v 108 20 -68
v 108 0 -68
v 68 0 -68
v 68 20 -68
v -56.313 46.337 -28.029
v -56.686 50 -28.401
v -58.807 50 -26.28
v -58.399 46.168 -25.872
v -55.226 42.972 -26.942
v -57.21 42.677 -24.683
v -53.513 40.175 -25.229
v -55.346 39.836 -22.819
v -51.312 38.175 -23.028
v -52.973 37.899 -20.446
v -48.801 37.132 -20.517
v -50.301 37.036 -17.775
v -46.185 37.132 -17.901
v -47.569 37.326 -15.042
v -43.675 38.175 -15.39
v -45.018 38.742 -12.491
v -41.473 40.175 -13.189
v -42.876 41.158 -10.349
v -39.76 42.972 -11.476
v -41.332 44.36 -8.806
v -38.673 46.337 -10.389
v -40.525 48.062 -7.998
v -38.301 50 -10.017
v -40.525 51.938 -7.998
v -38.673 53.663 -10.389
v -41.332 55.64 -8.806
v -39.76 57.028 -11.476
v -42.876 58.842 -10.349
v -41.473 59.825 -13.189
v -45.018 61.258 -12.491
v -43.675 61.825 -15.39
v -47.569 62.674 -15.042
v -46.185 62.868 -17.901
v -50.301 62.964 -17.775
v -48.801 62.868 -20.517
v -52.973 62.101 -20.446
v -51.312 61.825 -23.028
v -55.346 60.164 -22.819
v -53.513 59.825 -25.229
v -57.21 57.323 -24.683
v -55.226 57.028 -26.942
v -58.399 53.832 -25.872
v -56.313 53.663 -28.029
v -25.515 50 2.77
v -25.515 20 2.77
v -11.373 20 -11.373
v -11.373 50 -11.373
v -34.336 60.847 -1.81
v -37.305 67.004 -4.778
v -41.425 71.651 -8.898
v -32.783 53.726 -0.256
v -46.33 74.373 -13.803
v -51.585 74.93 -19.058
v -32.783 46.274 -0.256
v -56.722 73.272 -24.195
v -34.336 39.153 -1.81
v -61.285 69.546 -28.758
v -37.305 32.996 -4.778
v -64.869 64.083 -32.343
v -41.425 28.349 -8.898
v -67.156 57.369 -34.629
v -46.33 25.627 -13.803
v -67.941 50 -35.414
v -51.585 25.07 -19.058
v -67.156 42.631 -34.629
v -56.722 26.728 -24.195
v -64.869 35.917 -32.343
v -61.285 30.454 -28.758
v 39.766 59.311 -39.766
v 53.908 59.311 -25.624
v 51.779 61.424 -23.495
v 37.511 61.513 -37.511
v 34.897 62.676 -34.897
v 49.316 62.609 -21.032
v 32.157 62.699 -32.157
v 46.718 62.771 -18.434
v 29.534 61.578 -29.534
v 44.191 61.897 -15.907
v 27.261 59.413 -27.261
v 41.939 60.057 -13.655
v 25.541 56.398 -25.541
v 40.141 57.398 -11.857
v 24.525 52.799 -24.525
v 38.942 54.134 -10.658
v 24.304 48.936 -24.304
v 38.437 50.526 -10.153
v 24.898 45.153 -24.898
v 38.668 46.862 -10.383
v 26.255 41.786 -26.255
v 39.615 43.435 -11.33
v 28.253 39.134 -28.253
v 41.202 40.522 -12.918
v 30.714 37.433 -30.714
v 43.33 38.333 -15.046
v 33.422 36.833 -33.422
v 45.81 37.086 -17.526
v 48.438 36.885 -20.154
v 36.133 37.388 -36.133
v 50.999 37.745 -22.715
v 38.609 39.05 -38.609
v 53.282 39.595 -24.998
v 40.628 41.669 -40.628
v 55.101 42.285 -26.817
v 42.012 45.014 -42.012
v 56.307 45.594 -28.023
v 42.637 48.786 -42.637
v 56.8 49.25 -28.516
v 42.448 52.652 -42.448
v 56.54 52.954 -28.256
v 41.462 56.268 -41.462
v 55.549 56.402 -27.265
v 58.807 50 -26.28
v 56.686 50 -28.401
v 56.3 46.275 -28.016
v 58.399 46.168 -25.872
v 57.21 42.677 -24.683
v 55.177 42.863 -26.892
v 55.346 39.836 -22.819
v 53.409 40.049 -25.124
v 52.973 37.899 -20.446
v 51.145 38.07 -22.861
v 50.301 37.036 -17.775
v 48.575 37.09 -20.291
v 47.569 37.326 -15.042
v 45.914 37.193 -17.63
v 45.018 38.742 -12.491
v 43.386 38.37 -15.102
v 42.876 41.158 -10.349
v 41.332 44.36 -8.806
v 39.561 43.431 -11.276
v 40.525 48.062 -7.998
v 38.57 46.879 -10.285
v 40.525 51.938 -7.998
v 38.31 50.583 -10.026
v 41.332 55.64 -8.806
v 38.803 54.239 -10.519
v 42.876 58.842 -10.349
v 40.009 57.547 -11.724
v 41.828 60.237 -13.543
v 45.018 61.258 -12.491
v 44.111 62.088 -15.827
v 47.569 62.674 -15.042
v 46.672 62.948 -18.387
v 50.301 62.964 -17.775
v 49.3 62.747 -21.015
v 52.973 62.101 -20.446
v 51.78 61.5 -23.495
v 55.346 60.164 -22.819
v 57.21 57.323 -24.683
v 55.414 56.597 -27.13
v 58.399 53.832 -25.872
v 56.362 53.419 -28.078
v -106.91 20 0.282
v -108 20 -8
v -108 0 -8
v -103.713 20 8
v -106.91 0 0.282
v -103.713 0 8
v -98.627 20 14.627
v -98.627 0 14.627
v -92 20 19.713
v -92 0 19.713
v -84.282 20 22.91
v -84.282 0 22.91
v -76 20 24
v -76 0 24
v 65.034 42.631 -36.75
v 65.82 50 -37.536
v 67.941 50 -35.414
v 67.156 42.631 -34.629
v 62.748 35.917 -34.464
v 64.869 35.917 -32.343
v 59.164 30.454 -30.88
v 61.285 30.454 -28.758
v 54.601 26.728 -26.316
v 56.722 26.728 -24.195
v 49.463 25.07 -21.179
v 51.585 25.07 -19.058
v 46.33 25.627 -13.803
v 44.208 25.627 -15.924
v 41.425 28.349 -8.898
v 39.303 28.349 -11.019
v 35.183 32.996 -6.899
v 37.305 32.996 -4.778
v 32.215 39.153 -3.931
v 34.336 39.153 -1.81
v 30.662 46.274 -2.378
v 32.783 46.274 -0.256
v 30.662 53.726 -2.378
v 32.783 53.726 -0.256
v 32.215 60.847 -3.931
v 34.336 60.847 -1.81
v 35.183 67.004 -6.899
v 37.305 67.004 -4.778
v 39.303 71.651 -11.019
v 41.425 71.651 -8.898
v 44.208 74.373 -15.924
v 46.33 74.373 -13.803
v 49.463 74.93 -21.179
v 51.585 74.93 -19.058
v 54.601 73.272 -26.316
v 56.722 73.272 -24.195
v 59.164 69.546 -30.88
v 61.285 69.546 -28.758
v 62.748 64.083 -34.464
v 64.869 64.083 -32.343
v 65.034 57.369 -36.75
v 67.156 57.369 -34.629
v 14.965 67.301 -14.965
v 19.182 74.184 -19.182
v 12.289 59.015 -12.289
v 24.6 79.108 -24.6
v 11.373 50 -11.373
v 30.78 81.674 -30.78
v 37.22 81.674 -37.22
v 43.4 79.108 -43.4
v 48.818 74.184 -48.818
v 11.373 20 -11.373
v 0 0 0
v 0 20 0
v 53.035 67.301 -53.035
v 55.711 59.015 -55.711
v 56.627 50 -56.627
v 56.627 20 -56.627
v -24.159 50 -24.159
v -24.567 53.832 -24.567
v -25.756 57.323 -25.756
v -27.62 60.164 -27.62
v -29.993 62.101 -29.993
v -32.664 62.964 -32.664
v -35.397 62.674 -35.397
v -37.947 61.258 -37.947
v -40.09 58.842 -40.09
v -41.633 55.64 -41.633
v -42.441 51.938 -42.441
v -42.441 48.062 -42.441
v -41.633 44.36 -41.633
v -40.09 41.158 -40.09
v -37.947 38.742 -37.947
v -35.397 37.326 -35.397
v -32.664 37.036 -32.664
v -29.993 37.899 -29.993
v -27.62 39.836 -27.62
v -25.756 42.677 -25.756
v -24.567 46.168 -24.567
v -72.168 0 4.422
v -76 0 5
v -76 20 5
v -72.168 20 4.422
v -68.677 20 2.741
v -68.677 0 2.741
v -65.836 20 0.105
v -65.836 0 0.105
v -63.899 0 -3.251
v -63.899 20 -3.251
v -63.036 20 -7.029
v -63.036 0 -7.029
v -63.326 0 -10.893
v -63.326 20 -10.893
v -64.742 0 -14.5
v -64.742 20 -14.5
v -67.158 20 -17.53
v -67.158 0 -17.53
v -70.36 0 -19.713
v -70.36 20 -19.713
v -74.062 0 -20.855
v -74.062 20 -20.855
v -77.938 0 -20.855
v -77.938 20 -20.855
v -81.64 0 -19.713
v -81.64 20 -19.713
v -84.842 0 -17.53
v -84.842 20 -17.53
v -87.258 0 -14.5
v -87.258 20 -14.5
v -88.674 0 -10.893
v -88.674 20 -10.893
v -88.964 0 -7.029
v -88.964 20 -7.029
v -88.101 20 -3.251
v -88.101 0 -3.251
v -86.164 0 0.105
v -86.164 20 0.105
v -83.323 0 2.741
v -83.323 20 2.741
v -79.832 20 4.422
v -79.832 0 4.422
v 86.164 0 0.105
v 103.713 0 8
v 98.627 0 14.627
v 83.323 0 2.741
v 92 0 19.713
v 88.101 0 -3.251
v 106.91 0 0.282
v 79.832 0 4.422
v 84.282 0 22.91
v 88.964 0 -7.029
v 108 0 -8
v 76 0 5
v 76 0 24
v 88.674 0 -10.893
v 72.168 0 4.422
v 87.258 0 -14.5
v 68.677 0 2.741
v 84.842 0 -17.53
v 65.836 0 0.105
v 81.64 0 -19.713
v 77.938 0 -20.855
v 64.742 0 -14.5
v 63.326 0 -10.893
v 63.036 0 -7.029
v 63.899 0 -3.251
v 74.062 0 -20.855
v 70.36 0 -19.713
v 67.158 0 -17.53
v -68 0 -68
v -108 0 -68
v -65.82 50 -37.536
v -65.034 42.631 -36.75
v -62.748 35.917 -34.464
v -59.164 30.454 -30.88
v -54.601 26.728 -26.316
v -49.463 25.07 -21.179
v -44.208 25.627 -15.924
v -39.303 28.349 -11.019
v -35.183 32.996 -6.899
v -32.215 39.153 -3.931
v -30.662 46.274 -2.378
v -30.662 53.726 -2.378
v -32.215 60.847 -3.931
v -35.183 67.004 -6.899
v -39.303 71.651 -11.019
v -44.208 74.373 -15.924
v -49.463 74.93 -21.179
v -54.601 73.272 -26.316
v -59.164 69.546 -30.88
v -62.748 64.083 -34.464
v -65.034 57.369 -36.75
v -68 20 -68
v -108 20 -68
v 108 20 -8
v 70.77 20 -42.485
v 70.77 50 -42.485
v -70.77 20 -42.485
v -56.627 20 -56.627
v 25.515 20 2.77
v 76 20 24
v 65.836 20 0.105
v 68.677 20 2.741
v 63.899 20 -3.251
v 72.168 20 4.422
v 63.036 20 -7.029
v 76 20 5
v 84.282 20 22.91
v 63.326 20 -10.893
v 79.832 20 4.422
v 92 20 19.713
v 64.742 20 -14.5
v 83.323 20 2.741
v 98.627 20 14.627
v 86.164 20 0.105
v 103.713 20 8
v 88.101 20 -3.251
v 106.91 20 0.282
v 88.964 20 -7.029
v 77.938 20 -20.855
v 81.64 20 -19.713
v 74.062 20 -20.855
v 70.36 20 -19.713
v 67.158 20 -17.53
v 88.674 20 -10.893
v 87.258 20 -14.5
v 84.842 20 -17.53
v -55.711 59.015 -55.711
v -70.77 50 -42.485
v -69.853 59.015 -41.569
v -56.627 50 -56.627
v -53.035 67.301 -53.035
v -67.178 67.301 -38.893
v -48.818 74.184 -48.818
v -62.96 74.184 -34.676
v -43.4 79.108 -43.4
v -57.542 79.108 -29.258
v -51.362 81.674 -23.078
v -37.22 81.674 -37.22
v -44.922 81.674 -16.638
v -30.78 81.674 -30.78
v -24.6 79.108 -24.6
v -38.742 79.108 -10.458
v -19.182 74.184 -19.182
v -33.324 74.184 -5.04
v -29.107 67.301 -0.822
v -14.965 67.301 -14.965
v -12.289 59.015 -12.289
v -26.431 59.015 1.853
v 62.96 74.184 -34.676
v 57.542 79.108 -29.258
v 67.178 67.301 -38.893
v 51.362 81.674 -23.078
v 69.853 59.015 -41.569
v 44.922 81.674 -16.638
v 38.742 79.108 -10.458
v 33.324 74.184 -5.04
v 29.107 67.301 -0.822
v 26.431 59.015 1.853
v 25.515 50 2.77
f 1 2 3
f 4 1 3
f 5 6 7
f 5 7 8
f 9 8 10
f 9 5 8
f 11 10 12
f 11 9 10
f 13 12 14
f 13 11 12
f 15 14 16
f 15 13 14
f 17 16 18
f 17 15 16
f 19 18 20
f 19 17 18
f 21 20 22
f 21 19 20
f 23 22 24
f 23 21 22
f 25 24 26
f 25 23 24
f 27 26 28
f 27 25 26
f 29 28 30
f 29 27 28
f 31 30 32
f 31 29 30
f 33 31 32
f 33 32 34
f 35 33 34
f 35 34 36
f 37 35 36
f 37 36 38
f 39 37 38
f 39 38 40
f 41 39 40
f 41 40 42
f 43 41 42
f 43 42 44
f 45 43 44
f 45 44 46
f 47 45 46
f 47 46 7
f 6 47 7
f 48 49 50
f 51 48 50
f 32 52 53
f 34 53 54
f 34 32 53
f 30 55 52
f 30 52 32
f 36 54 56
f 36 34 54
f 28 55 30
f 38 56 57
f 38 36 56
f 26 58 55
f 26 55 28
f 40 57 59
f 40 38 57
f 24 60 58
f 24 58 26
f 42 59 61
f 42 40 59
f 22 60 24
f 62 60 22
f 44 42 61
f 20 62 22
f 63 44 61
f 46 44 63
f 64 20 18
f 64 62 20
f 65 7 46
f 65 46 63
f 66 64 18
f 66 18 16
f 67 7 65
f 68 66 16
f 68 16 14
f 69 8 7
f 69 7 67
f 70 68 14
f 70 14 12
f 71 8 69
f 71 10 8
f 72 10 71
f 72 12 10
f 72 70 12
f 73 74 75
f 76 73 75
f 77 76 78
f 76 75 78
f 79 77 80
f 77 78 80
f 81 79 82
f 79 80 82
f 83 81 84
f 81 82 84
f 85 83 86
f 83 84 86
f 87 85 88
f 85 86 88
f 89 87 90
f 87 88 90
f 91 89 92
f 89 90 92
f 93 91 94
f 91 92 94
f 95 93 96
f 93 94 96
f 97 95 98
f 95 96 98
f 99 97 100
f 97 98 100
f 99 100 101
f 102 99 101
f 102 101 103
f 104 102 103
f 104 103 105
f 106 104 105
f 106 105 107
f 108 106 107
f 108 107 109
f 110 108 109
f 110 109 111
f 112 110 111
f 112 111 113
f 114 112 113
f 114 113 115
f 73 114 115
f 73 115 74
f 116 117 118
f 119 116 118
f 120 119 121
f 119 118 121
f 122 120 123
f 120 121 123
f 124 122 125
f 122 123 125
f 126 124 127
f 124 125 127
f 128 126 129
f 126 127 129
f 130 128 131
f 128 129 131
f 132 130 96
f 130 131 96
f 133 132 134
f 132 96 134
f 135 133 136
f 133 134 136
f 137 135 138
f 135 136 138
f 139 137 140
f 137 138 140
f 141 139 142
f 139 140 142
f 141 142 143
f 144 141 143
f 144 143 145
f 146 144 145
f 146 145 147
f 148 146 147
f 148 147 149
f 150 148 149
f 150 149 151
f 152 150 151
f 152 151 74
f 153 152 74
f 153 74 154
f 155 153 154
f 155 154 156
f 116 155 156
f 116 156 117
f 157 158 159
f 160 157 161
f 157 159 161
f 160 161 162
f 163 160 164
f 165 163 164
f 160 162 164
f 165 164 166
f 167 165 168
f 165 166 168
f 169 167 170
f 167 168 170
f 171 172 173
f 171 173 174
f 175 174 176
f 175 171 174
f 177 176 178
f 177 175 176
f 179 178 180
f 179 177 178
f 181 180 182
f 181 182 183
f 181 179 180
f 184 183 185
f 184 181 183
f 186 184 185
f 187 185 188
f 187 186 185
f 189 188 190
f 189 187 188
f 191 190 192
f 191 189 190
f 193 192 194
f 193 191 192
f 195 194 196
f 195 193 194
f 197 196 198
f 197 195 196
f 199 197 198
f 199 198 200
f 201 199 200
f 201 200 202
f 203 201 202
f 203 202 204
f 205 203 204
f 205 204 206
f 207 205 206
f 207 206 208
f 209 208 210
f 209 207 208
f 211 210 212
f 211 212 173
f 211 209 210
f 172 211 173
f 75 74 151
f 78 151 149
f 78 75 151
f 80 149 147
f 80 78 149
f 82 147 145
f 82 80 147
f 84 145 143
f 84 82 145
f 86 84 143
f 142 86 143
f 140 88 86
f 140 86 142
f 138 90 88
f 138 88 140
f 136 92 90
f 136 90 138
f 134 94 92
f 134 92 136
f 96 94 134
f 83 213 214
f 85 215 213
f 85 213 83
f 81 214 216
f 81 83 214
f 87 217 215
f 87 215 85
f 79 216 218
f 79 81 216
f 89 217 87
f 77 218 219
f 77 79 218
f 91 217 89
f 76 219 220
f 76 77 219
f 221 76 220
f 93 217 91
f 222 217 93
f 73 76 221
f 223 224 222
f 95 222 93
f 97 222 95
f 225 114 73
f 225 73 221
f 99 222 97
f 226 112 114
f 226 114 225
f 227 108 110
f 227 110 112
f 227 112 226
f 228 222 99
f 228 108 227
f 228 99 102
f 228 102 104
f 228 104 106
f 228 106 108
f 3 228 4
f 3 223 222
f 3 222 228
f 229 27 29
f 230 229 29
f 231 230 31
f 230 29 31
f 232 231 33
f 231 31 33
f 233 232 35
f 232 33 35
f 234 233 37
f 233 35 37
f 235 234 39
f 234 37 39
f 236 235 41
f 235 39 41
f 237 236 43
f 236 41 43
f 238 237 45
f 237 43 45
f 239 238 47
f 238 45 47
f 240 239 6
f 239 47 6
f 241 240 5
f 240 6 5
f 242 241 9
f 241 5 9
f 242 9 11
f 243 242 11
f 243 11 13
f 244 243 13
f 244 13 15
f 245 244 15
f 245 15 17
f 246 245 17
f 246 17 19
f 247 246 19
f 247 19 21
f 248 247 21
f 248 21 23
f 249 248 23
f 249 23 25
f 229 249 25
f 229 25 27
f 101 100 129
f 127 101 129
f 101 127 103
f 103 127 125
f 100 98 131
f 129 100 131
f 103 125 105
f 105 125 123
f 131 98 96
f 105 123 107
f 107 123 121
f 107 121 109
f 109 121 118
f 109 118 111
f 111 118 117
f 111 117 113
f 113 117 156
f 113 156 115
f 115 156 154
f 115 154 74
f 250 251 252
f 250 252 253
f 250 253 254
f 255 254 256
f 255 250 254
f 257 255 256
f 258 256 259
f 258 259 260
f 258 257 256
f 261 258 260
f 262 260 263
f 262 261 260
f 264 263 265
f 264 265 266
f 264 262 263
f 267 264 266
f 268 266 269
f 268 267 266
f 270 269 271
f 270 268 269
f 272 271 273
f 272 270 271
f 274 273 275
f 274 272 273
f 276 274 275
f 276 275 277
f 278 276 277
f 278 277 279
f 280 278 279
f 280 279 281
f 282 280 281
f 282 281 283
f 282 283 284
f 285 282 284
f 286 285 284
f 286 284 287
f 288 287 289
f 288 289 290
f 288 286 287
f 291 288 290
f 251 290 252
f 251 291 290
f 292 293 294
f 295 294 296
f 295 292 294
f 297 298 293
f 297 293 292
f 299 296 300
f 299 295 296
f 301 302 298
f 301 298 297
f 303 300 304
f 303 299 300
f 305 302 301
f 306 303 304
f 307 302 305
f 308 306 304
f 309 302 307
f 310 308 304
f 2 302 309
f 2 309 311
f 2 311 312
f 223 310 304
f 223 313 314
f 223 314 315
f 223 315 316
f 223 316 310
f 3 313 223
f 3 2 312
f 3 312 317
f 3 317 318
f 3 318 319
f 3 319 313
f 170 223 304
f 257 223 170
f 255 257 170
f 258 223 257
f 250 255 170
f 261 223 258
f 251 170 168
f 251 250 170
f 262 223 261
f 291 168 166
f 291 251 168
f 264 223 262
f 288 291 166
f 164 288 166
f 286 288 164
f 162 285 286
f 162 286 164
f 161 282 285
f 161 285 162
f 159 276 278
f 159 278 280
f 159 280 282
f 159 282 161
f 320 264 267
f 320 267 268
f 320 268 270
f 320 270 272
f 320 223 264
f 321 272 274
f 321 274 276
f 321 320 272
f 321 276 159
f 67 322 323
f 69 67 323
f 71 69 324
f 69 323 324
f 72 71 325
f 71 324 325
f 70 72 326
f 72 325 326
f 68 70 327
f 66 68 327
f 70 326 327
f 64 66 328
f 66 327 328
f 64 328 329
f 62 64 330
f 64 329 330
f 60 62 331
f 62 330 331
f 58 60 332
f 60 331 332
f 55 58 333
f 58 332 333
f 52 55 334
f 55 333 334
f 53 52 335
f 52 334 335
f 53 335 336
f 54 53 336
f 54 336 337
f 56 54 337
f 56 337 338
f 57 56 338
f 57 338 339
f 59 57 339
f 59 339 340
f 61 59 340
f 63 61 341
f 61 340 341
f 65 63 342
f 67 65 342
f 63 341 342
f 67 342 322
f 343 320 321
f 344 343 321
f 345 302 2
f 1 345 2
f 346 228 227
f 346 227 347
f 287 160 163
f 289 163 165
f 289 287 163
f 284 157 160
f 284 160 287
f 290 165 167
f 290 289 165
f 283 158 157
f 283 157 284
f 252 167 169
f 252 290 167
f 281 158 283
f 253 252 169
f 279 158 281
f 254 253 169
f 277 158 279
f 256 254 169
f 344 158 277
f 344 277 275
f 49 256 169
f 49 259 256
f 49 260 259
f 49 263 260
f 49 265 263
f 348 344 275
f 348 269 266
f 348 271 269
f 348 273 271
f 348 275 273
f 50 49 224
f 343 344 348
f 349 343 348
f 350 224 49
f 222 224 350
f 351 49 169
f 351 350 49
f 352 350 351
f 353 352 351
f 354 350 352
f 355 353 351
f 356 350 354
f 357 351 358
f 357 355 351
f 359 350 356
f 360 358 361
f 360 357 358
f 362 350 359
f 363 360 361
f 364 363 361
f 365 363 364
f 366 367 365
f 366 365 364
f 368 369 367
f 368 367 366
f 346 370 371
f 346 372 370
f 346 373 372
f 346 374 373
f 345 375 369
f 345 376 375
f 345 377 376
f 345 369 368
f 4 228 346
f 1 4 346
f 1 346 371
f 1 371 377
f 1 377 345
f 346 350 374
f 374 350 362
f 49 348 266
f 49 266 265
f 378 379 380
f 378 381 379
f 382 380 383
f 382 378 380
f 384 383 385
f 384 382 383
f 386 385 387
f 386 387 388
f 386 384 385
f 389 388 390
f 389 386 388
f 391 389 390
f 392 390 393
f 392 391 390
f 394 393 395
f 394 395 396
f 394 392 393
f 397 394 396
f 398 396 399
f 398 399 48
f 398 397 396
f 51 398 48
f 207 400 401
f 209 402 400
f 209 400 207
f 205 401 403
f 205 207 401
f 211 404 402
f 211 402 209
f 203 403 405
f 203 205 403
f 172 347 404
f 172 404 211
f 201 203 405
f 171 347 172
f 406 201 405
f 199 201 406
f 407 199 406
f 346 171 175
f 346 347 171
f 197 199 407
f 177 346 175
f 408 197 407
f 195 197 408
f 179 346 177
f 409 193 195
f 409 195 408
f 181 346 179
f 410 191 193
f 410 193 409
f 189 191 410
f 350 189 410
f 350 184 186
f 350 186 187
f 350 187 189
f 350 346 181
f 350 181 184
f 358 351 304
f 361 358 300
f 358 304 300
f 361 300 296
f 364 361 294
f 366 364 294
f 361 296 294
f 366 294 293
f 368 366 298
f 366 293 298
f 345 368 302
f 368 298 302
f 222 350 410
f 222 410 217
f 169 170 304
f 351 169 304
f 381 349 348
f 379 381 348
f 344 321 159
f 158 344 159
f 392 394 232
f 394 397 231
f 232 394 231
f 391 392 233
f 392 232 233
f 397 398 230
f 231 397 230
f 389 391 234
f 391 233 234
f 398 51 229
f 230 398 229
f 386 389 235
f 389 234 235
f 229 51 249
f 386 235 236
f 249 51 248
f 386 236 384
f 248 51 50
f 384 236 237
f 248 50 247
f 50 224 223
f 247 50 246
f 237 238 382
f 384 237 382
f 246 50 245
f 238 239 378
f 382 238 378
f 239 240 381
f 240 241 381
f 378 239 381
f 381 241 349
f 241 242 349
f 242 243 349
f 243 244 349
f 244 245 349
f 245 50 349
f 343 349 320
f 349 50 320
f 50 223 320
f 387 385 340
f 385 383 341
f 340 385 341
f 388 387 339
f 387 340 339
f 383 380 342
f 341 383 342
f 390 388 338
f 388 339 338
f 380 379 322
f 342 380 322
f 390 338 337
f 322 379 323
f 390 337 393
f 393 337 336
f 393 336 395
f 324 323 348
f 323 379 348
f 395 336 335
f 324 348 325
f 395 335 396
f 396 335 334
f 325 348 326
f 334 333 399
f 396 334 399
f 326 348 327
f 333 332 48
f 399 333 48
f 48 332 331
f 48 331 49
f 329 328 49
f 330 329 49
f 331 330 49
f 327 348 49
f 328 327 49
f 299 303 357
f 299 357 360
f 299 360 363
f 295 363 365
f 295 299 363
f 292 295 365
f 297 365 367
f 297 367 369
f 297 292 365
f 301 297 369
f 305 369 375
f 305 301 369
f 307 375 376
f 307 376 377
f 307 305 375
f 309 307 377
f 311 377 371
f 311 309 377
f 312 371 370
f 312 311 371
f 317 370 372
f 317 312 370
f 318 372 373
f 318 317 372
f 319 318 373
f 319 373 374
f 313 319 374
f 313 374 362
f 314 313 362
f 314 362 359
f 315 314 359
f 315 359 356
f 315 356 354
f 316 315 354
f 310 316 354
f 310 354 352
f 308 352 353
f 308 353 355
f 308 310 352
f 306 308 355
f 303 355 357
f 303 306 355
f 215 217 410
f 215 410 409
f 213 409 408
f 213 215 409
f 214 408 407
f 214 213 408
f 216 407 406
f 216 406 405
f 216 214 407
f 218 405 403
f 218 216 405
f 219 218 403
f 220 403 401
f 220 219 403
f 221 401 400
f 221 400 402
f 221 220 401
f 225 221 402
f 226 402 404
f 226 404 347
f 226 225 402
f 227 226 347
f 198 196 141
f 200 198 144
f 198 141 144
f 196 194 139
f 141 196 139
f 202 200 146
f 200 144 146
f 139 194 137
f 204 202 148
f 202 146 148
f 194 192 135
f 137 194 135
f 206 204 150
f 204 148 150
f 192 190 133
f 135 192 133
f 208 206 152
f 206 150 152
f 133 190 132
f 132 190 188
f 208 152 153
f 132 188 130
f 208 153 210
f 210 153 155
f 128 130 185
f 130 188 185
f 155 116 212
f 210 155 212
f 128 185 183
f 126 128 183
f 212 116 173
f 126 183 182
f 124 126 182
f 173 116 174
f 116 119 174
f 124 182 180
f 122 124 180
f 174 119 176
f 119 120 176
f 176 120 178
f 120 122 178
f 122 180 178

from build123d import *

# Parameters (mm, degrees)
SKETCH1_R                   = 13
BOSS_EXTRUDE1_DEPTH         = 20
BOSS_EXTRUDE2_DEPTH         = 82
FILLET1_RADIUS              = 32
FILLET1_LENGTH              = 20
SKETCH3_R                   = 25
SKETCH3_R_2                 = 13
BOSS_EXTRUDE3_DEPTH         = 3
CUT_EXTRUDE2_DEPTH          = 169.493417496
FILLET1_OF_MIRROR1_2_RADIUS = 32
FILLET1_OF_MIRROR1_2_LENGTH = 20
SKETCH5_R                   = 13
CUT_EXTRUDE3_DEPTH          = 169.493417496


with BuildPart() as part:
    # Sketch1 → Boss-Extrude1 (new body)
    with BuildSketch(Plane(origin=(0, 0, 0), x_dir=(1, 0, 0), z_dir=(0, 1, 0))):
        with BuildLine():
            Line((-68, 68), (-108, 68))
            Line((-108, 68), (-108, 8))
            ThreePointArc((-108, 8), (-98.627416998, -14.627416998), (-76, -24))
            Line((-76, -24), (-0.620811238, -24))
            Line((-0.620811238, -24), (76, -24))
            ThreePointArc((76, -24), (98.627416998, -14.627416998), (108, 8))
            Line((108, 8), (108, 68))
            Line((108, 68), (68, 68))
            Line((68, 68), (56.627416998, 56.627416998))
            Line((56.627416998, 56.627416998), (70.769552622, 42.485281374))
            Line((70.769552622, 42.485281374), (25.514718626, -2.769552622))
            Line((25.514718626, -2.769552622), (11.372583002, 11.372583002))
            Line((11.372583002, 11.372583002), (0, 0))
            Line((0, 0), (-11.372583002, 11.372583002))
            Line((-11.372583002, 11.372583002), (-25.514718626, -2.769552622))
            Line((-25.514718626, -2.769552622), (-70.769552622, 42.485281374))
            Line((-70.769552622, 42.485281374), (-56.627416998, 56.627416998))
            Line((-56.627416998, 56.627416998), (-68, 68))
        make_face()
        with Locations(Location((-76, 8, 0), (0, 0, 270))):
            Circle(SKETCH1_R, mode=Mode.SUBTRACT)
        with Locations(Location((76, 8, 0), (0, 0, 270))):
            Circle(SKETCH1_R, mode=Mode.SUBTRACT)
    extrude(amount=BOSS_EXTRUDE1_DEPTH)

    # Sketch1<3> → Boss-Extrude2 (add)
    with BuildSketch(Plane(origin=(0, 0, 0), x_dir=(1, 0, 0), z_dir=(0, 1, 0))):
        Polygon((-11.372583002, 11.372583002), (-56.627416998, 56.627416998), (-70.769552622, 42.485281374), (-25.514718626, -2.769552622), align=None)
    boss_extrude2 = extrude(amount=BOSS_EXTRUDE2_DEPTH)

    # Fillet1: full round fillet: the end face becomes a half cylinder, R = half its width
    fillet1_face = Plane((-41.071067812, 82, -26.928932188), x_dir=(0.707106781187, 0, -0.707106781187), z_dir=(0, 1, 0))  # on the end face: x along it, z out of the body
    fillet1_slab = fillet1_face.offset(-FILLET1_RADIUS / 2) * Box(FILLET1_LENGTH, 2 * FILLET1_RADIUS, FILLET1_RADIUS, mode=Mode.PRIVATE)  # the body's end, R deep
    fillet1_round = Plane((-41.071067812, 50, -26.928932188), x_dir=(0, 1, 0), z_dir=(0.707106781187, 0, -0.707106781187)) * Cylinder(FILLET1_RADIUS, FILLET1_LENGTH, mode=Mode.PRIVATE)  # its axis R under the face
    add(fillet1_slab - fillet1_round, mode=Mode.SUBTRACT)

    # Sketch3 → Boss-Extrude3 (add)
    with BuildSketch(Plane(origin=(-14.142135624, 0, 14.142135624), x_dir=(0.7071067811865487, 0, 0.7071067811865465), z_dir=(-0.7071067811865465, 0, 0.7071067811865487))):
        with Locations(Location((-48.083261121, 50, 0), (0, 0, 180))):
            Circle(SKETCH3_R)
        with Locations(Location((-47.165571339, 50, 0), (0, 0, 180))):
            Circle(SKETCH3_R_2, mode=Mode.SUBTRACT)
    boss_extrude3 = extrude(amount=BOSS_EXTRUDE3_DEPTH)

    # Sketch3<3> → Cut-Extrude2 (cut, through all)
    with BuildSketch(Plane(origin=(-14.142135624, 0, 14.142135624), x_dir=(0.7071067811865487, 0, 0.7071067811865465), z_dir=(-0.7071067811865465, 0, 0.7071067811865487))):
        with BuildLine():
            ThreePointArc((-60.165571339, 50), (-47.165571339, 37), (-34.165571339, 50))
            Line((-34.165571339, 50), (-60.165571339, 50))
        make_face()
        with BuildLine():
            Line((-60.165571339, 50), (-34.165571339, 50))
            ThreePointArc((-34.165571339, 50), (-47.165571339, 63), (-60.165571339, 50))
        make_face()
    extrude(amount=-CUT_EXTRUDE2_DEPTH, mode=Mode.SUBTRACT)

    # Mirror1: Boss-Extrude2, Boss-Extrude3 across plane
    add(boss_extrude2.mirror(Plane(origin=(0, 0, 0), x_dir=(0, 0, 1), z_dir=(1, 0, 0))))
    add(boss_extrude3.mirror(Plane(origin=(0, 0, 0), x_dir=(0, 0, 1), z_dir=(1, 0, 0))))

    # Fillet1 of Mirror1 2: full round fillet: the end face becomes a half cylinder, R = half its width
    fillet1_of_mirror1_2_face = Plane((41.071067812, 82, -26.928932188), x_dir=(-0.707106781187, 0, -0.707106781187), z_dir=(0, 1, 0))  # on the end face: x along it, z out of the body
    fillet1_of_mirror1_2_slab = fillet1_of_mirror1_2_face.offset(-FILLET1_OF_MIRROR1_2_RADIUS / 2) * Box(FILLET1_OF_MIRROR1_2_LENGTH, 2 * FILLET1_OF_MIRROR1_2_RADIUS, FILLET1_OF_MIRROR1_2_RADIUS, mode=Mode.PRIVATE)  # the body's end, R deep
    fillet1_of_mirror1_2_round = Plane((41.071067812, 50, -26.928932188), x_dir=(0, 1, 0), z_dir=(-0.707106781187, 0, -0.707106781187)) * Cylinder(FILLET1_OF_MIRROR1_2_RADIUS, FILLET1_OF_MIRROR1_2_LENGTH, mode=Mode.PRIVATE)  # its axis R under the face
    add(fillet1_of_mirror1_2_slab - fillet1_of_mirror1_2_round, mode=Mode.SUBTRACT)

    # Sketch5 → Cut-Extrude3 (cut, through all)
    with BuildSketch(Plane(origin=(14.142135624, 0, 14.142135624), x_dir=(0.7071067811865487, 0, -0.7071067811865465), z_dir=(0.7071067811865465, 0, 0.7071067811865487))):
        with Locations(Location((47.340345076, 49.832858071, 0), (0, 0, 46.811598371))):
            Circle(SKETCH5_R)
    extrude(amount=-CUT_EXTRUDE3_DEPTH, mode=Mode.SUBTRACT)


solid = part.part
